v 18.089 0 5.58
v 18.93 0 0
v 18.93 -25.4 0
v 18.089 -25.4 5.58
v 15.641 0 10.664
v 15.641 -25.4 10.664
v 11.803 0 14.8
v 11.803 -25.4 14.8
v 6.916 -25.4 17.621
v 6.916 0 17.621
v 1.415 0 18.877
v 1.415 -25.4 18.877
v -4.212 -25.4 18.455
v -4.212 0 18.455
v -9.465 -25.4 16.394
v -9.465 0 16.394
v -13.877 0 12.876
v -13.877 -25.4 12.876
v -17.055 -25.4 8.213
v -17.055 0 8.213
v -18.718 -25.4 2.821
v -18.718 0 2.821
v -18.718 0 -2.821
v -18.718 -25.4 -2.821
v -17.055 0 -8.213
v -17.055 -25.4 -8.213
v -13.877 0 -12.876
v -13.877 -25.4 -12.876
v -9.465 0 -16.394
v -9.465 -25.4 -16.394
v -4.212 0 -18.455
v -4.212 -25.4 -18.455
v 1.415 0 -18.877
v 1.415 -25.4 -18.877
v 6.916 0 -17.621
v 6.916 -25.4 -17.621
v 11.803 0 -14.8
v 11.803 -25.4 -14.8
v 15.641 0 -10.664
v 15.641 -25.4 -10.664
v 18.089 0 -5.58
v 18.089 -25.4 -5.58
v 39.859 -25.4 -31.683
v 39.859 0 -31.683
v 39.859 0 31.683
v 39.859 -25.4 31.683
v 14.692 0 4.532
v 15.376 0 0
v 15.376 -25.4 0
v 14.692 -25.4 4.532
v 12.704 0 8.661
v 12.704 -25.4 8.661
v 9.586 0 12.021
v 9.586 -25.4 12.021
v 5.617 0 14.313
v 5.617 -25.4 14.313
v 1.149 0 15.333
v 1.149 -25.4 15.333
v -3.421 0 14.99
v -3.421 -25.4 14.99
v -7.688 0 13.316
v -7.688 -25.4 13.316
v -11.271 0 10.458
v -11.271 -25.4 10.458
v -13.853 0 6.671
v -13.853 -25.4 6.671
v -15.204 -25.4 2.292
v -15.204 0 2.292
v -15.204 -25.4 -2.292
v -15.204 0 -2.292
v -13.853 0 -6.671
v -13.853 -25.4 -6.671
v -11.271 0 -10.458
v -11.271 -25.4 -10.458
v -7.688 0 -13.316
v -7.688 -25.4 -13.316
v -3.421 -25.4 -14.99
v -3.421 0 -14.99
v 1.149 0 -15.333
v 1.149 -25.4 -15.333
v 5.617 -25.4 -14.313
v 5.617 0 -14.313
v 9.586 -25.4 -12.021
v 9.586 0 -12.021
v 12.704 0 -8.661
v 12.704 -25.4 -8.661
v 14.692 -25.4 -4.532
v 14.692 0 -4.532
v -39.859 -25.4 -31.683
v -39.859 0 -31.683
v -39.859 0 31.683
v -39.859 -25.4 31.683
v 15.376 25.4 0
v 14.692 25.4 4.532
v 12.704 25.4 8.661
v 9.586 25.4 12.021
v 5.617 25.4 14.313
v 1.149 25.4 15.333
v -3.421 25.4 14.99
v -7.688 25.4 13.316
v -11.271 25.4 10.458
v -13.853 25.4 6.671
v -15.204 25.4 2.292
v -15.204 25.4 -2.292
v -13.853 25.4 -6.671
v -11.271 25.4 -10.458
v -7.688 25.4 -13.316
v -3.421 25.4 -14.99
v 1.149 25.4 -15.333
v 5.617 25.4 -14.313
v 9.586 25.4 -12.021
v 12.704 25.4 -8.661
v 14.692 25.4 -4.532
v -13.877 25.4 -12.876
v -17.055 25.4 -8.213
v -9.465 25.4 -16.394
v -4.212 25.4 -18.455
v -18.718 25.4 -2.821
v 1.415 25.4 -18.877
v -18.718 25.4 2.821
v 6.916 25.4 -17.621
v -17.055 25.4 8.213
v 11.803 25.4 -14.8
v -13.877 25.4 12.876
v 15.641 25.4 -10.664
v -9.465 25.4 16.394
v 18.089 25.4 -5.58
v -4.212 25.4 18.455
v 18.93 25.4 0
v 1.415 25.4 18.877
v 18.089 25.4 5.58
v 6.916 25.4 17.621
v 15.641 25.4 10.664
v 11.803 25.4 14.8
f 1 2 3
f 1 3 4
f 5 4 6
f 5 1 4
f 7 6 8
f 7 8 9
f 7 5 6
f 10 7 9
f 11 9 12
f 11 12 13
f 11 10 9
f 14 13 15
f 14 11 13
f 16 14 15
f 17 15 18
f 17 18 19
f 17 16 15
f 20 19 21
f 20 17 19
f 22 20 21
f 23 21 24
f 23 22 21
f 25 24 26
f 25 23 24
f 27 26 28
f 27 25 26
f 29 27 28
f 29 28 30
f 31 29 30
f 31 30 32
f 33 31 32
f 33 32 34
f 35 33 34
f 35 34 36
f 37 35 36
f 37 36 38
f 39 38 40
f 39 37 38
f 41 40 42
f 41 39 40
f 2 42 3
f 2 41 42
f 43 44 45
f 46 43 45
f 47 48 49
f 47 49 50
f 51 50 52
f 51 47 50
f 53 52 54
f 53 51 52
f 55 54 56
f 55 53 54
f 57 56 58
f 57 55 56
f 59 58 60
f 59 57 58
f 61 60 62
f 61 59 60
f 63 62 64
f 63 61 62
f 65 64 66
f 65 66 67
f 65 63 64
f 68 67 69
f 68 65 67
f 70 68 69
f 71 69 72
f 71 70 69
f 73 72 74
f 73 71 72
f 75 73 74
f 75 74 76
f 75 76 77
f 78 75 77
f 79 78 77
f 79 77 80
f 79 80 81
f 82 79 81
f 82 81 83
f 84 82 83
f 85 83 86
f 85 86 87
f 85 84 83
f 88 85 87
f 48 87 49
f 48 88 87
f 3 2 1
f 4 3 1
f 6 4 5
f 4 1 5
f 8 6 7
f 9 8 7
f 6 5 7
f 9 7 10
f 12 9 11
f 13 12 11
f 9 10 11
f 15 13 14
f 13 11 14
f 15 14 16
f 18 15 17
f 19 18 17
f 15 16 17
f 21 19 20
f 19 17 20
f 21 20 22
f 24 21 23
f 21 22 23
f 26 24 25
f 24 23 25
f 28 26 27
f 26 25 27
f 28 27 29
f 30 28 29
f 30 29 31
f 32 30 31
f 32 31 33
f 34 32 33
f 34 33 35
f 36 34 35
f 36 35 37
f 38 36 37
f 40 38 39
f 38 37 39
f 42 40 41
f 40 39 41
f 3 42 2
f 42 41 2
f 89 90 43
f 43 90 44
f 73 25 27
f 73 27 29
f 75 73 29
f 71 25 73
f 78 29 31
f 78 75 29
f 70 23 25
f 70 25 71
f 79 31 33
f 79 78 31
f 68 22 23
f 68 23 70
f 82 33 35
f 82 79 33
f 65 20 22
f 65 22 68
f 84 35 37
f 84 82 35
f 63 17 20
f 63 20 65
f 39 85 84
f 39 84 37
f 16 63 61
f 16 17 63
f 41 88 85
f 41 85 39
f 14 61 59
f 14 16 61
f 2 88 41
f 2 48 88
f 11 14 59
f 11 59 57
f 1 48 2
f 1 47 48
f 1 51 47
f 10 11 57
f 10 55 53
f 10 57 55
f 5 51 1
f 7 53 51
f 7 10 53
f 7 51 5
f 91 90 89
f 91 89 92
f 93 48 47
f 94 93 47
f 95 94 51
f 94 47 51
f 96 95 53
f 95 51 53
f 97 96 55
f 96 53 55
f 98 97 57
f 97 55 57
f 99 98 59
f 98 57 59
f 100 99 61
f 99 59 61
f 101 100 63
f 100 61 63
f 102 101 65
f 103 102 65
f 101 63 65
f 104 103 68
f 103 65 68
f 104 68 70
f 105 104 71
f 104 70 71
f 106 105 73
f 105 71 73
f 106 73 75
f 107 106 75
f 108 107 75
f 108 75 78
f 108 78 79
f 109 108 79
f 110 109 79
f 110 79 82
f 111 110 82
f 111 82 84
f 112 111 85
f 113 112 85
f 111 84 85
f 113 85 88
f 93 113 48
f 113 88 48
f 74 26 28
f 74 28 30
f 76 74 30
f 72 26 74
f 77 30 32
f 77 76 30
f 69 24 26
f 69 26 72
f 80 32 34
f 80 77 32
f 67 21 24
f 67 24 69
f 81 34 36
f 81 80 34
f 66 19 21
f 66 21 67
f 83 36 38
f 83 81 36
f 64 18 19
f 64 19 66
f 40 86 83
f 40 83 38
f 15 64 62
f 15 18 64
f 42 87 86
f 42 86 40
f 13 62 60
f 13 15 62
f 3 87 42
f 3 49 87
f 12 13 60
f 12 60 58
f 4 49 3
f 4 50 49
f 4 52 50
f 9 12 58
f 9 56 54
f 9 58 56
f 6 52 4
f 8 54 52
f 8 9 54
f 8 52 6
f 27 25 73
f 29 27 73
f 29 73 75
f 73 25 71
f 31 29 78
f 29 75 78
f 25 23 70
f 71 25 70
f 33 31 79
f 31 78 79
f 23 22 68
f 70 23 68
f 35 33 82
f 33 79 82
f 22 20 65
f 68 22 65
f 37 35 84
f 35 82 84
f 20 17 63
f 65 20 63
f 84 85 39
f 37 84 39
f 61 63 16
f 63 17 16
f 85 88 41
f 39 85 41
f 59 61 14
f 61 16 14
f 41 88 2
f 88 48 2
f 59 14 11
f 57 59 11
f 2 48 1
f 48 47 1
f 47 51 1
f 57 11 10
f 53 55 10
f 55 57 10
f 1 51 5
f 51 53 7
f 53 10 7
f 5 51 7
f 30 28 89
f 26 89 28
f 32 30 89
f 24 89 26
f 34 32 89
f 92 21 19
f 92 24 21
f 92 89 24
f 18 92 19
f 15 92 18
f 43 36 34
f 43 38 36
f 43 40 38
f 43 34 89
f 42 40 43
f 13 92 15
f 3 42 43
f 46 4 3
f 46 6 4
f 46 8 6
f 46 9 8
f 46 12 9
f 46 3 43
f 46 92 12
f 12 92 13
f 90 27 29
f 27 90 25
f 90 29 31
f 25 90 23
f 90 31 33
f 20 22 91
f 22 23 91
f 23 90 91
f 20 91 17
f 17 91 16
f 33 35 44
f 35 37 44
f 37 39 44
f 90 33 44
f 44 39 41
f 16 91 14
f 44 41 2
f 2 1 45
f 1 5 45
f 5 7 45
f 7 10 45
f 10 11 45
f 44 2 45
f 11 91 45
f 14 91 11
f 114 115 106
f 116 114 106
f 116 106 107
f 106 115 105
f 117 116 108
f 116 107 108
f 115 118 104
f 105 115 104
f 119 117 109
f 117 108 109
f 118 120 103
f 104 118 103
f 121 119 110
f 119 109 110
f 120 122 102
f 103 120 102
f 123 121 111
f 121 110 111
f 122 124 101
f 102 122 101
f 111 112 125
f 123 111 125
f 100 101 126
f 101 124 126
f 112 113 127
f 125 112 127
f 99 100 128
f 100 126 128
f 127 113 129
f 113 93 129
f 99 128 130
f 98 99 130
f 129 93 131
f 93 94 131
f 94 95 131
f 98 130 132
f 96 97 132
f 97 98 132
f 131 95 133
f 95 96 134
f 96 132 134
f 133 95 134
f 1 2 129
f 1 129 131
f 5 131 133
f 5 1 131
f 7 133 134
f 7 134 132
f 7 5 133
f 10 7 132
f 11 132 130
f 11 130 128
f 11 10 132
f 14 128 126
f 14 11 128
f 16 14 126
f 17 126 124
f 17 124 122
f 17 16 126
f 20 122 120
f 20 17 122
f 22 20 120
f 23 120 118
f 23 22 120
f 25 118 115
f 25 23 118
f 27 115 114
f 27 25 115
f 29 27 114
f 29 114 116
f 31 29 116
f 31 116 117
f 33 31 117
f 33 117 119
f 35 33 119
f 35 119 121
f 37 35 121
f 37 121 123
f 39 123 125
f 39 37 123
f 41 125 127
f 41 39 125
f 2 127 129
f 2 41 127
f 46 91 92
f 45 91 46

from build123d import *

# Parameters (mm, degrees)
F0_W        = 79.717994
F0_H        = 63.365586
F0_R        = 18.929868
F1_DEPTH    = 25.4
F0_R_2      = 15.375508
F2_DEPTH    = 25.4
F2_FACE_R   = 18.929868
F2_FACE_R_2 = 15.375508
F3_DEPTH    = 25.4


with BuildPart() as f1:
    # F0 (on Front) → F1 (new body)
    with BuildSketch(Plane.XZ):
        Rectangle(F0_W, F0_H)
        Circle(F0_R, mode=Mode.SUBTRACT)
    extrude(amount=F1_DEPTH)

    # F0 (on Front) → F2 (join)
    with BuildSketch(Plane.XZ):
        Circle(F0_R)
        Circle(F0_R_2, mode=Mode.SUBTRACT)
    extrude(amount=-F2_DEPTH)


with BuildPart() as f3:
    # F2_face (on face) → F3 (new body)
    with BuildSketch(Plane.XZ):
        Circle(F2_FACE_R)
        Circle(F2_FACE_R_2, mode=Mode.SUBTRACT)
    extrude(amount=F3_DEPTH)


solid = Compound([f1.part, f3.part])
